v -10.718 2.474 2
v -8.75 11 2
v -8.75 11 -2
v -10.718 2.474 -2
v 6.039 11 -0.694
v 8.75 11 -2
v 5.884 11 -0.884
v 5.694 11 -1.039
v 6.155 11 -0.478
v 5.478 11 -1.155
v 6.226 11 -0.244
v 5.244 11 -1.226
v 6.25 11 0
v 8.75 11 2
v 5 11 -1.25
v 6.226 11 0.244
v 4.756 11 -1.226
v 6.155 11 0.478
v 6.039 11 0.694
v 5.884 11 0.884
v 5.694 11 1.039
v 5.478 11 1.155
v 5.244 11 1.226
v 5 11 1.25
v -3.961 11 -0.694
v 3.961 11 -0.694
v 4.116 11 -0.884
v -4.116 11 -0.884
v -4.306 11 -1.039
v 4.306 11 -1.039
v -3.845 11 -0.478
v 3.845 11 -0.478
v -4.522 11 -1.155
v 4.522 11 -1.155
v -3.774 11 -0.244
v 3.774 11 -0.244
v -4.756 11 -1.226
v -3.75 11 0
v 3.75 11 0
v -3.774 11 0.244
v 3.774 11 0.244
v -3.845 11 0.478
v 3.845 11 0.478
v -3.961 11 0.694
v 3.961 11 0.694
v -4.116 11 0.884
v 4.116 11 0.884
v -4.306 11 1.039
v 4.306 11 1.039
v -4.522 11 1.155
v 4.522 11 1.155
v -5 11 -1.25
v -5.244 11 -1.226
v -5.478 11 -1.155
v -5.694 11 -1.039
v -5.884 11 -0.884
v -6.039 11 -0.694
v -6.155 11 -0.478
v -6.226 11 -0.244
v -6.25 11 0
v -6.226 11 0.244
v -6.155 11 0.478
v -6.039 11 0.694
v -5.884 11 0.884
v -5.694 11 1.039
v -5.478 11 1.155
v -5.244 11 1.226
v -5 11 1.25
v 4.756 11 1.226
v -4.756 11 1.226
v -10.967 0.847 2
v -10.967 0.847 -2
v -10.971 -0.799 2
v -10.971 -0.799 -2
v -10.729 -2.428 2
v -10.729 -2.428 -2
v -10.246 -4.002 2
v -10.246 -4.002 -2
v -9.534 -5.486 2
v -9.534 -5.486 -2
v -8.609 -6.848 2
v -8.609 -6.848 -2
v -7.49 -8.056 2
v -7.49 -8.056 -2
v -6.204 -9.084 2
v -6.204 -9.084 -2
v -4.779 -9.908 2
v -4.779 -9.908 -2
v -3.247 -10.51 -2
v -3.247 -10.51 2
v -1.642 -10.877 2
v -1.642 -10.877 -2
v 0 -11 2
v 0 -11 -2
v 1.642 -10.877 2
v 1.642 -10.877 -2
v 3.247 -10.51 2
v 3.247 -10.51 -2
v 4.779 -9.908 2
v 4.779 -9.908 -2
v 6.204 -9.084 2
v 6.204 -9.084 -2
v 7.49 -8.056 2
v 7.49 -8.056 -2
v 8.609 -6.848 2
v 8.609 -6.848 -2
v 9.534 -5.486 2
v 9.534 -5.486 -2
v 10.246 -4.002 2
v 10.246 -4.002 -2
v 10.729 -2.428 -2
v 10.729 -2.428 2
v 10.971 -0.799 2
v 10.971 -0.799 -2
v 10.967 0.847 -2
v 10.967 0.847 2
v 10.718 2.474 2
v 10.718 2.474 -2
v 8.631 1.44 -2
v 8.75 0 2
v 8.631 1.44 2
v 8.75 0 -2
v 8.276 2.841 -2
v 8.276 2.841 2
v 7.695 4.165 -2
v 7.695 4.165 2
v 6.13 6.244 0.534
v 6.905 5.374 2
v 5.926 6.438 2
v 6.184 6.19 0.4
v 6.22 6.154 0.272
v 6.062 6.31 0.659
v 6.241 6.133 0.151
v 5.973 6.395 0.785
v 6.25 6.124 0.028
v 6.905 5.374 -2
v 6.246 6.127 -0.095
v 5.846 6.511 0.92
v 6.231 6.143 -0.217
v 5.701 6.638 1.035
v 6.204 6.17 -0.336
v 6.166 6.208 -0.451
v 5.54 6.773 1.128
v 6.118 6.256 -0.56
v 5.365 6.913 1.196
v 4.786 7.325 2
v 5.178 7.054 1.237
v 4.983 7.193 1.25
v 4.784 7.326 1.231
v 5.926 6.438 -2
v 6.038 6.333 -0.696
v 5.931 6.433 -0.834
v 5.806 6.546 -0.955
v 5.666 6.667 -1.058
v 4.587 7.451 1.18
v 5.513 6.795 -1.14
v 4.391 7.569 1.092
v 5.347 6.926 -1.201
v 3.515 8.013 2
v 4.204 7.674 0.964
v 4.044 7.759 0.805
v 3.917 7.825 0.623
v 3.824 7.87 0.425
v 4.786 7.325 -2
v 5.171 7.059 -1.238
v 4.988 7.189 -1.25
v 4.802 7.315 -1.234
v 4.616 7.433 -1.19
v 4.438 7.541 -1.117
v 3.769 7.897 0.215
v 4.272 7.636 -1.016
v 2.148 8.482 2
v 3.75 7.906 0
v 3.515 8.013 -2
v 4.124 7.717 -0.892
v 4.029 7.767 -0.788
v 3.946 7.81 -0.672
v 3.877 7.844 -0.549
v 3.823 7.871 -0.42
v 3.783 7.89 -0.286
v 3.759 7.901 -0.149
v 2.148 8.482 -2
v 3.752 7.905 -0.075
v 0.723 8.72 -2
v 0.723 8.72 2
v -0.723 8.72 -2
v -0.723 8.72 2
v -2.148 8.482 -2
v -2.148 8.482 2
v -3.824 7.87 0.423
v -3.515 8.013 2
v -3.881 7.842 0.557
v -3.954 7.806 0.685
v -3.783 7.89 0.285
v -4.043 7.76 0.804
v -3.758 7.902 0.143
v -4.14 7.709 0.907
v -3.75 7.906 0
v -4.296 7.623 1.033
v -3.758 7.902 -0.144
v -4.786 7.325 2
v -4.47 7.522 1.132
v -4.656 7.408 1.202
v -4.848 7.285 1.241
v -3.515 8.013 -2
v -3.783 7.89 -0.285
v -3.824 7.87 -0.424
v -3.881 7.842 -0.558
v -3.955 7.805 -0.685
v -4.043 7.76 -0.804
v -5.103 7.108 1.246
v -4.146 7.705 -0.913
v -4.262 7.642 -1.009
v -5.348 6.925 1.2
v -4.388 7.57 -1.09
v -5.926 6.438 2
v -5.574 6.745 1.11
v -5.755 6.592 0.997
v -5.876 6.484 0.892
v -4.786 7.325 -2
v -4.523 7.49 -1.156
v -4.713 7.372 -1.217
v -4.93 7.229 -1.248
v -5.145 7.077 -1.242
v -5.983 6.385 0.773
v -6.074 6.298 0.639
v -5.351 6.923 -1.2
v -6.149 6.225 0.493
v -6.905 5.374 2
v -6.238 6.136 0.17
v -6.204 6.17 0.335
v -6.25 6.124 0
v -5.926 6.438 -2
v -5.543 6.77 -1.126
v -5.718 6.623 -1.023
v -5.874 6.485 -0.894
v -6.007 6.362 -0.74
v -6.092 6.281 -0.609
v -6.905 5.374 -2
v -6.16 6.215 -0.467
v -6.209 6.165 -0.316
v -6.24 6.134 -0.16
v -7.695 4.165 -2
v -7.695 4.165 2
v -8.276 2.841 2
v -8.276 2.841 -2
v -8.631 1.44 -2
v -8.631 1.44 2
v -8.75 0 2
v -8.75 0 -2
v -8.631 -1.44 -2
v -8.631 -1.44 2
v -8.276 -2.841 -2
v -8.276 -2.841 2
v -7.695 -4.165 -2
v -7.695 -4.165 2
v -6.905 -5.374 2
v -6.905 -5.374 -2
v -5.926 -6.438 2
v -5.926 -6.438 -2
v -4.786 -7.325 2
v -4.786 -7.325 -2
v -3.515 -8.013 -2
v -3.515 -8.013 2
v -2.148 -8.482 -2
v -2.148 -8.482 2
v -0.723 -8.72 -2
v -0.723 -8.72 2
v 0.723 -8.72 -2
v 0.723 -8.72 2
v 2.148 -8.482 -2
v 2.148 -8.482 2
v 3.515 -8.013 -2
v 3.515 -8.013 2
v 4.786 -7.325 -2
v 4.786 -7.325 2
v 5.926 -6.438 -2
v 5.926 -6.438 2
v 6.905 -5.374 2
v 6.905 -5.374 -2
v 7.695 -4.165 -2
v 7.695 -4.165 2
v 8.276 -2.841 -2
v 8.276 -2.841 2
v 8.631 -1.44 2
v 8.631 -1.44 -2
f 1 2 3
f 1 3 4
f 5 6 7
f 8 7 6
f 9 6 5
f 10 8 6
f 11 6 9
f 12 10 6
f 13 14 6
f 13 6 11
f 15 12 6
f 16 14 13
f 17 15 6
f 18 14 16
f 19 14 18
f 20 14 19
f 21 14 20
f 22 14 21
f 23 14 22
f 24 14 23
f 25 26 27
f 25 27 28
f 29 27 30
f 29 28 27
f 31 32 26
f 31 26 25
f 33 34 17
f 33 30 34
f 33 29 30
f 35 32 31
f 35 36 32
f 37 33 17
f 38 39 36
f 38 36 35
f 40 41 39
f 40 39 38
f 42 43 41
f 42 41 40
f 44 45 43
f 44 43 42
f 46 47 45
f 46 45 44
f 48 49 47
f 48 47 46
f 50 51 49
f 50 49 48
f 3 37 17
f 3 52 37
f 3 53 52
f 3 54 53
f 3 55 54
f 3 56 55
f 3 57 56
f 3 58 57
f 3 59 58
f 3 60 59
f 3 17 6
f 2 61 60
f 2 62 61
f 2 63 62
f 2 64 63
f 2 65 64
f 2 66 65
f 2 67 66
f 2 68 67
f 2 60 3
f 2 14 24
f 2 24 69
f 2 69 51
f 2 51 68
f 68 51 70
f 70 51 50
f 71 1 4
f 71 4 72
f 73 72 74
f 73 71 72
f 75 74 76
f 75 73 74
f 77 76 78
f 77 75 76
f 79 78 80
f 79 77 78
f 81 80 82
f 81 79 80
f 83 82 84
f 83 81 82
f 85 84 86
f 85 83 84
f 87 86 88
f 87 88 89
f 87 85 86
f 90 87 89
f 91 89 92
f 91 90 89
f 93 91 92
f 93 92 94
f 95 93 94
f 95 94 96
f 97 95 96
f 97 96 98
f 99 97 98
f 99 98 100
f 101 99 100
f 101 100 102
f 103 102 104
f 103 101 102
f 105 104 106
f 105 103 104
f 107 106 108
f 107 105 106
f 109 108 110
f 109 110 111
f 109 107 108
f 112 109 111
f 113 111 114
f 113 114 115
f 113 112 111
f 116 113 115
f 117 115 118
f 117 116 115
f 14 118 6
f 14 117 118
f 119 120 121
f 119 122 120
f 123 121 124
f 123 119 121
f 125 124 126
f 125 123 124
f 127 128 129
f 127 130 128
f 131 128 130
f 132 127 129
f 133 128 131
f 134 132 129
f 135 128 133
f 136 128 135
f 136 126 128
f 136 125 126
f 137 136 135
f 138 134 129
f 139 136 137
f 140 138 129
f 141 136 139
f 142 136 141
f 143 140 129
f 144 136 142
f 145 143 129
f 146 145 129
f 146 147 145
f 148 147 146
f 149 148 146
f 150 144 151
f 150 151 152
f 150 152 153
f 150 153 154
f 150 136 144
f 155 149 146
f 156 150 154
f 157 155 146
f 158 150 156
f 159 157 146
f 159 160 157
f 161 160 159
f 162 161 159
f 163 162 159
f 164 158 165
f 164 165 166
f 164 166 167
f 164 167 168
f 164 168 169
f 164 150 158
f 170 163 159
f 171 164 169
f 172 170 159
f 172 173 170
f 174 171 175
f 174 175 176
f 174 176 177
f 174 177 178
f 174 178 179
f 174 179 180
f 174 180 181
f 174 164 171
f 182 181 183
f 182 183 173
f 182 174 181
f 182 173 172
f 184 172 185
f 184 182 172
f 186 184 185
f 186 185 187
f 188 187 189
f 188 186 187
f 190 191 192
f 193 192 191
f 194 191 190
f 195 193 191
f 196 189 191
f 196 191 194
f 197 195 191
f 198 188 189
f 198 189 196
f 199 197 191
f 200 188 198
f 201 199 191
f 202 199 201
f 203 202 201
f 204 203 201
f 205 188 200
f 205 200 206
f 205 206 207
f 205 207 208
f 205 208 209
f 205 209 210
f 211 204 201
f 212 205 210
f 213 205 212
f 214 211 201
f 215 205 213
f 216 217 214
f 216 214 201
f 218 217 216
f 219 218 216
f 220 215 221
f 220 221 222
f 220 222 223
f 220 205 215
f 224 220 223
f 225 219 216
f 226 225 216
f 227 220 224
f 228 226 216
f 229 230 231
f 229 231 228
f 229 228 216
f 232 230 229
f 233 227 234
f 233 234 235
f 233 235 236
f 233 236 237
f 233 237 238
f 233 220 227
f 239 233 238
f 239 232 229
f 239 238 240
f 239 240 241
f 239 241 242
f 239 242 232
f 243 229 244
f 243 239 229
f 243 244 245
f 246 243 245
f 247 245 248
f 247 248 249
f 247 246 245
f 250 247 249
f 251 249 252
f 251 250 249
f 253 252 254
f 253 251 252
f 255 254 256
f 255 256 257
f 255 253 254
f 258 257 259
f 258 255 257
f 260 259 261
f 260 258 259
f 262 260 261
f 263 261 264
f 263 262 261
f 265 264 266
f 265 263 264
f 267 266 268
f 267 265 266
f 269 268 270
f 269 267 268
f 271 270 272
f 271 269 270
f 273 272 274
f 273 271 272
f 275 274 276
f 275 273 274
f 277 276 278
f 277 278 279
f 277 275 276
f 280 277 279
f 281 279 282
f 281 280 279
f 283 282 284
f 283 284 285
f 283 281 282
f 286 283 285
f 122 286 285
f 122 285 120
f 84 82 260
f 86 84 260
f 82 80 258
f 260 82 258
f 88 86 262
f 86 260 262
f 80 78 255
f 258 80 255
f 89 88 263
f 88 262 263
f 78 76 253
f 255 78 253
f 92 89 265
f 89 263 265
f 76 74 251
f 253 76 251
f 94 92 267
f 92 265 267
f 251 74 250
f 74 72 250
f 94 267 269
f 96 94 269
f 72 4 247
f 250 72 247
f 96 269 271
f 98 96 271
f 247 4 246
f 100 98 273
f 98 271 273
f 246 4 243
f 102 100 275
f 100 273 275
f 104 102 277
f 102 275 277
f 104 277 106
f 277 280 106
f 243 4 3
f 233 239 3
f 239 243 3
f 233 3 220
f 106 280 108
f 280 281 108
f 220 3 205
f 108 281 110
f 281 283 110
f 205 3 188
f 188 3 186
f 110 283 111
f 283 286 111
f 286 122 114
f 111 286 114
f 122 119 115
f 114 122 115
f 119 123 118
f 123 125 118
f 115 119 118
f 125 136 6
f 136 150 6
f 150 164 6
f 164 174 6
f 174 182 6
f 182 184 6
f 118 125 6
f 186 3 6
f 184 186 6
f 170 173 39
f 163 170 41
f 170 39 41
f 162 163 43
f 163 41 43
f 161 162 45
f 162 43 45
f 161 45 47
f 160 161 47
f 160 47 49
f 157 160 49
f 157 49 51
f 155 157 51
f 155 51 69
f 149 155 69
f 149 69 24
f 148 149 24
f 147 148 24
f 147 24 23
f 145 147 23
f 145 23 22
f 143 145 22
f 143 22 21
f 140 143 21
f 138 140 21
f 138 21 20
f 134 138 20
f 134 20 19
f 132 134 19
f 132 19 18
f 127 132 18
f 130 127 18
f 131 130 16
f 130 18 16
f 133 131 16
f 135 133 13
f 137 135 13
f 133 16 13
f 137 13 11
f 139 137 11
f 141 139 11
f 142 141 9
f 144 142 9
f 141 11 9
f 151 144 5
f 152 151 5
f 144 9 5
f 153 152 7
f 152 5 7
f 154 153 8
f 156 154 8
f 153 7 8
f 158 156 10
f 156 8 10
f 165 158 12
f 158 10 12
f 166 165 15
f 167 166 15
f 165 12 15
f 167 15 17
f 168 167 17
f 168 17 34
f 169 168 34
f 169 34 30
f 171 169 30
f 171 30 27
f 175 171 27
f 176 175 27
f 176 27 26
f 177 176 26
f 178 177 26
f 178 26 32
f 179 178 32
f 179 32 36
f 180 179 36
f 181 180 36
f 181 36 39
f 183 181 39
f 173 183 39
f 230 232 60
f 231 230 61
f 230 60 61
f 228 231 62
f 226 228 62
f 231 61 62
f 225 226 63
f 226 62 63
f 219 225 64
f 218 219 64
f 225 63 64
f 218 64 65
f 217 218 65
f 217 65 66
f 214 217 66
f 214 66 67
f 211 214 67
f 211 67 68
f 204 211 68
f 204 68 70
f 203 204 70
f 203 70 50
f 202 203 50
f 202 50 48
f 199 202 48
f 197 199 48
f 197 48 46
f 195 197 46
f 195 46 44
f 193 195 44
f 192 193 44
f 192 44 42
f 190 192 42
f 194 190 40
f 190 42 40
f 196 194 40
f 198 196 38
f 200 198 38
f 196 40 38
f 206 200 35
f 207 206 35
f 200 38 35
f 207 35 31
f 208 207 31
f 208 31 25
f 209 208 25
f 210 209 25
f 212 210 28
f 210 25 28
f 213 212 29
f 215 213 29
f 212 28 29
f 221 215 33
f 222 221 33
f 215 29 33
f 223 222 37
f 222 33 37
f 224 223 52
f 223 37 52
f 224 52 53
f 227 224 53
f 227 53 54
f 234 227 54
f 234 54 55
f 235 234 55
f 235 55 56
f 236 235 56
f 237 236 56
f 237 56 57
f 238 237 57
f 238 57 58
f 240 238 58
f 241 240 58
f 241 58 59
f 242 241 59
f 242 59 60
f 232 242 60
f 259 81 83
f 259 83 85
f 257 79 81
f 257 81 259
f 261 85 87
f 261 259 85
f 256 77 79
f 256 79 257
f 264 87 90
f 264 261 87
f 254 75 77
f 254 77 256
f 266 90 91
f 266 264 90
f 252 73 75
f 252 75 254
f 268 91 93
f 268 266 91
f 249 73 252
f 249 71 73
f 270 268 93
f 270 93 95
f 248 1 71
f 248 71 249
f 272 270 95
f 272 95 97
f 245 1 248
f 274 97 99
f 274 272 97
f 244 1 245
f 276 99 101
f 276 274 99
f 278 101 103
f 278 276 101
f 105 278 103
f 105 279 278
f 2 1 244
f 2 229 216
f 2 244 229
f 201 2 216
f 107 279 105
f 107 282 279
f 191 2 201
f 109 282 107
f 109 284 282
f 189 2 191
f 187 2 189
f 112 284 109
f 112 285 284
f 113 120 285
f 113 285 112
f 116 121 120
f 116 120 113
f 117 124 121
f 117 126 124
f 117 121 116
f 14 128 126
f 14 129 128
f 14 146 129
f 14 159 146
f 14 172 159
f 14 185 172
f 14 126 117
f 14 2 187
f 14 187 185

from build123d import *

# Parameters (mm, degrees)
SKETCH1_R                = 8.75
BOSS_EXTRUDE1_DEPTH      = 2
THREADEDHOLES_REACH      = 26.678
THREADEDHOLES_END_RADIUS = 8.75
SKETCH2_R                = 1.25


with BuildPart() as part:
    # Sketch1 → Boss-Extrude1 (new, symmetric)
    with BuildSketch(Plane.XY):
        with BuildLine():
            Line((8.75, 11), (-8.75, 11))
            Line((-8.75, 11), (-10.718127175, 2.47421702))
            ThreePointArc((-10.718127175, 2.47421702), (0, -11), (10.718127175, 2.47421702))
            Line((10.718127175, 2.47421702), (8.75, 11))
        make_face()
        Circle(SKETCH1_R, mode=Mode.SUBTRACT)
    extrude(amount=BOSS_EXTRUDE1_DEPTH, both=True)

    # ThreadedHoles: up to this cylinder (the profile starts outside it)
    threadedholes_end = Plane(origin=(0, 0, 0), z_dir=(0, 0, -1)) * Cylinder(THREADEDHOLES_END_RADIUS, 71.856, mode=Mode.PRIVATE)
    # Sketch2 → ThreadedHoles (cut, up to the surface)
    with BuildSketch(Plane(origin=(0, 11, 0), x_dir=(1, 0, 0), z_dir=(0, 1, 0)), mode=Mode.PRIVATE) as threadedholes_sk1:
        with Locations(Location((-5, 0, 0), (0, 0, 180))):
            Circle(SKETCH2_R)
    threadedholes_tool1 = extrude(threadedholes_sk1.sketch, amount=-THREADEDHOLES_REACH, mode=Mode.PRIVATE) - threadedholes_end
    add(threadedholes_tool1.solids().sort_by_distance((-5, 11, 0))[0], mode=Mode.SUBTRACT)
    # Sketch2 → ThreadedHoles (cut, up to the surface)
    with BuildSketch(Plane(origin=(0, 11, 0), x_dir=(1, 0, 0), z_dir=(0, 1, 0)), mode=Mode.PRIVATE) as threadedholes_sk2:
        with Locations(Location((5, 0, 0), (0, 0, 180))):
            Circle(SKETCH2_R)
    threadedholes_tool2 = extrude(threadedholes_sk2.sketch, amount=-THREADEDHOLES_REACH, mode=Mode.PRIVATE) - threadedholes_end
    add(threadedholes_tool2.solids().sort_by_distance((5, 11, 0))[0], mode=Mode.SUBTRACT)


solid = part.part
